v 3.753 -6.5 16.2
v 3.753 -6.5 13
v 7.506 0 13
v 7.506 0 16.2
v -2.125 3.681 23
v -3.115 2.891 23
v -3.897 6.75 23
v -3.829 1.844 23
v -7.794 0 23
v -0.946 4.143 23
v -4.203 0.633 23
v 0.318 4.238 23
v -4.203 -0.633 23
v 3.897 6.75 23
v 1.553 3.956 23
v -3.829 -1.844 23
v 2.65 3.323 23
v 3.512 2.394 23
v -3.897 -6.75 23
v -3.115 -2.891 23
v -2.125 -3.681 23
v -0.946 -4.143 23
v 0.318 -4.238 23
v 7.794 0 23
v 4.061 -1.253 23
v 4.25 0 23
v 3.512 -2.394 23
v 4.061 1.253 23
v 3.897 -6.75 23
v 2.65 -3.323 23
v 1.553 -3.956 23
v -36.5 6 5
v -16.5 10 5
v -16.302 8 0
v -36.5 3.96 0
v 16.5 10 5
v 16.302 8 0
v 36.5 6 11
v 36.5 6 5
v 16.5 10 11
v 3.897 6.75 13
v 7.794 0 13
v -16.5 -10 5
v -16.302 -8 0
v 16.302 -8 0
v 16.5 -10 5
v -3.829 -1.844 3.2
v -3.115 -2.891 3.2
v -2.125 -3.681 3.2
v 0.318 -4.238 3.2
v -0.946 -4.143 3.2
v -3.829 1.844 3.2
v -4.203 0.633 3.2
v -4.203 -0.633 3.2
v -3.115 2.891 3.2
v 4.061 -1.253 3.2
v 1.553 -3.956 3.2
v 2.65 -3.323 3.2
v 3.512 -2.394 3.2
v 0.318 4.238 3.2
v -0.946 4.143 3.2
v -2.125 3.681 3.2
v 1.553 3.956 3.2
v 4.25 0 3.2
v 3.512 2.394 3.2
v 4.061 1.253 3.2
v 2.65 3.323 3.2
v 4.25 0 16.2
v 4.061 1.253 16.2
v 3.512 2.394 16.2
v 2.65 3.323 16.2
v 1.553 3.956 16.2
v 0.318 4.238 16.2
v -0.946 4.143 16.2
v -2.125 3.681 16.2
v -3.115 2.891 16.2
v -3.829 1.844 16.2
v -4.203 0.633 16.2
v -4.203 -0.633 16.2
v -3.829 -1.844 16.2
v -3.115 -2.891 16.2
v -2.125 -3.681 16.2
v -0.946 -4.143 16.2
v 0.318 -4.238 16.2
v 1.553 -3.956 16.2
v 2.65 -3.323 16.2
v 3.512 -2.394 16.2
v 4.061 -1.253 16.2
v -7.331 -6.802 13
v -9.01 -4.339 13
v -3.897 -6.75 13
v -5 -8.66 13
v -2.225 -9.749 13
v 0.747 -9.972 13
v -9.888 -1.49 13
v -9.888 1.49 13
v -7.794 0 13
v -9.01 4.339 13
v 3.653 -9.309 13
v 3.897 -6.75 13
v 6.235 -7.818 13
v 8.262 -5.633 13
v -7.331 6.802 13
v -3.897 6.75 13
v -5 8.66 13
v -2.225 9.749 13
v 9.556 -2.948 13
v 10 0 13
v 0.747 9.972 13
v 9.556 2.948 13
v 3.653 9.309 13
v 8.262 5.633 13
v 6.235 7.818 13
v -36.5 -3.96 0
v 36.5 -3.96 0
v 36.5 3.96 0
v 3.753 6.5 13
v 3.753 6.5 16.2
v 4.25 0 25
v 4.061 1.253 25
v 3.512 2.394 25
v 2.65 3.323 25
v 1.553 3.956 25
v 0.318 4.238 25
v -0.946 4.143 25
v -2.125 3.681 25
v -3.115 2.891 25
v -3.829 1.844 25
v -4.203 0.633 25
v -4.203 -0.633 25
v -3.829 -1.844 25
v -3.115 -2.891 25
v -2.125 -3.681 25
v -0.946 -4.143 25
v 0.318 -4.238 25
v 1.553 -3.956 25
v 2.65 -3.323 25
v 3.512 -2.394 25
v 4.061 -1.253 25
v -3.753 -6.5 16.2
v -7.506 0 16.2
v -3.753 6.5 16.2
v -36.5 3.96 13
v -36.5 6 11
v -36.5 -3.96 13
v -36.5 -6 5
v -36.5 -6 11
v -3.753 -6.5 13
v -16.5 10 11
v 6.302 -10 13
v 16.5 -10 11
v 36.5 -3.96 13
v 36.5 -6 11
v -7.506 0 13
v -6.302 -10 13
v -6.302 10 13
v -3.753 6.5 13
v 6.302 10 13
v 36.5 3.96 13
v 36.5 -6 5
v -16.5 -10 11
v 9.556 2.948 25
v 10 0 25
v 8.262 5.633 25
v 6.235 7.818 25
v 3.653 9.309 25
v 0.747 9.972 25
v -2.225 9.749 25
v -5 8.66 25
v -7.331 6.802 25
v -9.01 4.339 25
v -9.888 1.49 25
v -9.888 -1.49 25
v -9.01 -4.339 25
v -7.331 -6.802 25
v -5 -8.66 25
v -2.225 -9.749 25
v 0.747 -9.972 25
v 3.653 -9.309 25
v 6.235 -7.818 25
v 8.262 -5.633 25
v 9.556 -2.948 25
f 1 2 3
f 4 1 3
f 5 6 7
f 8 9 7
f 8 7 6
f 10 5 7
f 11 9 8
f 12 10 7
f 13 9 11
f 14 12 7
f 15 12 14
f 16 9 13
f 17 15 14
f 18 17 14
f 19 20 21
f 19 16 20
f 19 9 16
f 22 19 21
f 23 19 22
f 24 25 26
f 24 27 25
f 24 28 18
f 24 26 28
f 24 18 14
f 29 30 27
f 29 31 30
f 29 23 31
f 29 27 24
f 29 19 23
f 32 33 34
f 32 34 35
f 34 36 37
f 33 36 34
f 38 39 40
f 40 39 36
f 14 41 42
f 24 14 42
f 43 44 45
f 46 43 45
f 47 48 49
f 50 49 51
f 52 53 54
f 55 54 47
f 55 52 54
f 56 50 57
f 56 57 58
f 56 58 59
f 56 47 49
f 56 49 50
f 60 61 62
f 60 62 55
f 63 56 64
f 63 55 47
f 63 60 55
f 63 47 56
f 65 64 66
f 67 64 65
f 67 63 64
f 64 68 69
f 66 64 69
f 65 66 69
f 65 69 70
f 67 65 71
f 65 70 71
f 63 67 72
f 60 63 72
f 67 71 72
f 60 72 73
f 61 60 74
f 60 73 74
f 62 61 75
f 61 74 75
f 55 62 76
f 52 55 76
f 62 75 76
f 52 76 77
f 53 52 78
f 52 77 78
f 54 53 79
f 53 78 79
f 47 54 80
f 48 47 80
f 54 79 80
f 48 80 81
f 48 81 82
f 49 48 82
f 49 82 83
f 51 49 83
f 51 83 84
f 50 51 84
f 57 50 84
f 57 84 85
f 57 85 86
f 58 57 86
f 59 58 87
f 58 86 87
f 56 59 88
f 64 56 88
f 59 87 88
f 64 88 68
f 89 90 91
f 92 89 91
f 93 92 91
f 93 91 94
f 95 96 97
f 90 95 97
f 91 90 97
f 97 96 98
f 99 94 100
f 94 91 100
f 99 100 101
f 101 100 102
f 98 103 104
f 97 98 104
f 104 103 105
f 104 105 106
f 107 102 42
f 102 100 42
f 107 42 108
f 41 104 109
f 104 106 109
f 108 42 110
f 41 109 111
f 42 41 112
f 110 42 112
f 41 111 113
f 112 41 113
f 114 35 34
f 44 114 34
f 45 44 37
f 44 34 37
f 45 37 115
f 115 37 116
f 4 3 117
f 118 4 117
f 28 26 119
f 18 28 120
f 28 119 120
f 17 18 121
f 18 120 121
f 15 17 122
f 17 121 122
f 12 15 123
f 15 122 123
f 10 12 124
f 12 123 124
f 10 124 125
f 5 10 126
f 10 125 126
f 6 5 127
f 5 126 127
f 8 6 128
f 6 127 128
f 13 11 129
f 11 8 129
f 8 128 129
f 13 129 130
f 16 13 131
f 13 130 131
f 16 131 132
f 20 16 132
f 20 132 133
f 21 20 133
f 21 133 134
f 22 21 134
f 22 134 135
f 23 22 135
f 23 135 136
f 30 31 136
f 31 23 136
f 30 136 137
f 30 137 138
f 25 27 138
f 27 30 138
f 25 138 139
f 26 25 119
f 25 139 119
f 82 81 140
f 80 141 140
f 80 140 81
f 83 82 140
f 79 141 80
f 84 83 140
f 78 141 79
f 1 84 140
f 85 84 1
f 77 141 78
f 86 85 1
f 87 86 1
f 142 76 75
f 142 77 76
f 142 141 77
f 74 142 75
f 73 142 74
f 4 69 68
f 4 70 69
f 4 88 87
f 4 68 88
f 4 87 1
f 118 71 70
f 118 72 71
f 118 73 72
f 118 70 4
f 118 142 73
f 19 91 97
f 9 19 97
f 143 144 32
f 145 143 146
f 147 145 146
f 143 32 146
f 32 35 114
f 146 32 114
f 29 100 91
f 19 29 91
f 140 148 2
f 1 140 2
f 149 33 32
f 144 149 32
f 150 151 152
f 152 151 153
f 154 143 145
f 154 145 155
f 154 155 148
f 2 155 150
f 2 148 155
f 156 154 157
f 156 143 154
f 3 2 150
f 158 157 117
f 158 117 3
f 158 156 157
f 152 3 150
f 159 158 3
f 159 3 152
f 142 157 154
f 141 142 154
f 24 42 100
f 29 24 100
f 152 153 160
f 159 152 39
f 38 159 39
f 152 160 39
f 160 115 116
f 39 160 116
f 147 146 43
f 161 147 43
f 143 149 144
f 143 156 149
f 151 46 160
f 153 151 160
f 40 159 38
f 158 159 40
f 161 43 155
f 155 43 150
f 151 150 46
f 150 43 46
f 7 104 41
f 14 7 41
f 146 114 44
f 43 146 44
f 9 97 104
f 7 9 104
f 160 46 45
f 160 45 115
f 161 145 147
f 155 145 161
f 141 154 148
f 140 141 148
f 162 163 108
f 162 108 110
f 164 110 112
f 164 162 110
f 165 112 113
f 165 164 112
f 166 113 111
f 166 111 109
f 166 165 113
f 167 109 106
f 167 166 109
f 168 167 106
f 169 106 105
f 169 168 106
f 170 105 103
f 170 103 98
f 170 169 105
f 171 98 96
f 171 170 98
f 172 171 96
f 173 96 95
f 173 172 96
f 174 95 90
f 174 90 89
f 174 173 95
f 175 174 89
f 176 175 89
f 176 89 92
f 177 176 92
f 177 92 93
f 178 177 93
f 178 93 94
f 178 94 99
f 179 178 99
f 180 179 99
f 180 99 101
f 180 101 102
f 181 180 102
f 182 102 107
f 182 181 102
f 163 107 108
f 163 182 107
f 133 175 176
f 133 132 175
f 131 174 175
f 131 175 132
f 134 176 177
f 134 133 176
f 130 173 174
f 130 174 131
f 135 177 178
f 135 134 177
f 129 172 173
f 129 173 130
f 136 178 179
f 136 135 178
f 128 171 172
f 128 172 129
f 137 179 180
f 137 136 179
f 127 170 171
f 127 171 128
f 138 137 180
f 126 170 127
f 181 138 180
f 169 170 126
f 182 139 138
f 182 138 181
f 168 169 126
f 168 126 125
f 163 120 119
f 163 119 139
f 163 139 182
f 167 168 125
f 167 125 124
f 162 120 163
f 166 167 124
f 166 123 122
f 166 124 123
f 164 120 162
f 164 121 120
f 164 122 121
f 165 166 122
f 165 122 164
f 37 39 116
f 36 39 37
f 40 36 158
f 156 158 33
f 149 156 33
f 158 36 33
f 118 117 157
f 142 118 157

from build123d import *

# Parameters (mm, degrees)
F1_DEPTH    = 13
F3_DEPTH    = 3.2
F4_R        = 4.25
F5_DEPTH    = 13
F6_C1_SIZE2 = 2
F6_C1_SIZE  = 5
F6_C2_SIZE2 = 2
F6_C2_SIZE  = 5
F6_C3_SIZE2 = 5
F6_C3_SIZE  = 2
F6_C4_SIZE2 = 5
F6_C4_SIZE  = 2
F6_C5_SIZE2 = 5
F6_C5_SIZE  = 2
F6_C6_SIZE2 = 5
F6_C6_SIZE  = 2
F7_SIZE     = 2
F9_R        = 10
F9_R_2      = 4.25
F10_DEPTH   = 12
F11_R       = 4.25
F12_DEPTH   = 10


with BuildPart() as f1:
    # F0 (on Top) → F1 (new body)
    with BuildSketch(Plane.XY):
        Polygon((-16.5, -10), (16.5, -10), (36.5, -6), (36.5, 6), (16.5, 10), (-16.5, 10), (-36.5, 6), (-36.5, -6), align=None)
    extrude(amount=F1_DEPTH)

    # F2 (on face) → F3 (join)
    with BuildSketch(Plane.XY.offset(13)):
        Polygon((-3.7527767497, -6.5), (3.7527767497, -6.5), (7.5055534995, 0), (3.7527767497, 6.5), (-3.7527767497, 6.5), (-7.5055534995, 0), align=None)
    extrude(amount=F3_DEPTH)

    # F4 (on face) → F5 (cut)
    with BuildSketch(Plane.XY.offset(16.2)):
        Circle(F4_R)
    extrude(amount=-F5_DEPTH, mode=Mode.SUBTRACT)

    # F6: chamfer of 5 x 2 on 6 edges, made by hand

    # F6_c1
    f6_c1_edges = [f1.edges().sort_by_distance(p)[0] for p in [
        (0, -10, 0),
    ]]
    f6_c1_side = f1.faces().sort_by_distance((0, -10, 0.04))[0]
    chamfer(f6_c1_edges, length=F6_C1_SIZE, length2=F6_C1_SIZE2, reference=f6_c1_side)

    # F6_c2
    f6_c2_edges = [f1.edges().sort_by_distance(p)[0] for p in [
        (-31.5, -7, 0),
    ]]
    f6_c2_side = f1.faces().sort_by_distance((-31.5, -7, 0.04))[0]
    chamfer(f6_c2_edges, length=F6_C2_SIZE, length2=F6_C2_SIZE2, reference=f6_c2_side)

    # F6_c3
    f6_c3_edges = [f1.edges().sort_by_distance(p)[0] for p in [
        (31.5, -7, 0),
    ]]
    f6_c3_side = f1.faces().sort_by_distance((31.4921553546, -6.960776773, 0))[0]
    chamfer(f6_c3_edges, length=F6_C3_SIZE, length2=F6_C3_SIZE2, reference=f6_c3_side)

    # F6_c4
    f6_c4_edges = [f1.edges().sort_by_distance(p)[0] for p in [
        (26.5, 8, 0),
    ]]
    f6_c4_side = f1.faces().sort_by_distance((26.4921553546, 7.960776773, 0))[0]
    chamfer(f6_c4_edges, length=F6_C4_SIZE, length2=F6_C4_SIZE2, reference=f6_c4_side)

    # F6_c5
    f6_c5_edges = [f1.edges().sort_by_distance(p)[0] for p in [
        (-5.0990195136, 10, 0),
    ]]
    f6_c5_side = f1.faces().sort_by_distance((-5.0990195136, 9.96, 0))[0]
    chamfer(f6_c5_edges, length=F6_C5_SIZE, length2=F6_C5_SIZE2, reference=f6_c5_side)

    # F6_c6
    f6_c6_edges = [f1.edges().sort_by_distance(p)[0] for p in [
        (-31.5, 7, 0),
    ]]
    f6_c6_side = f1.faces().sort_by_distance((-31.4921553546, 6.960776773, 0))[0]
    chamfer(f6_c6_edges, length=F6_C6_SIZE, length2=F6_C6_SIZE2, reference=f6_c6_side)

    # F7
    f7_edges = [f1.edges().sort_by_distance(p)[0] for p in [
        (26.5, -8, 13),
        (26.5, 8, 13),
        (-26.5, 8, 13),
        (-26.5, -8, 13),
    ]]
    chamfer(f7_edges, length=F7_SIZE)


with BuildPart() as f10:
    # F9 (on offset) → F10 (new body)
    with BuildSketch(Plane.XY.offset(25)):
        Circle(F9_R)
        Circle(F9_R_2, mode=Mode.SUBTRACT)
    extrude(amount=-F10_DEPTH)

    # F11 (on face) → F12 (cut)
    with BuildSketch(Plane(origin=(0, 0, 13), x_dir=(1, 0, 0), z_dir=(0, 0, -1))):
        Polygon((-3.897114317, -6.75), (3.897114317, -6.75), (7.7942286341, 0), (3.897114317, 6.75), (-3.897114317, 6.75), (-7.7942286341, 0), align=None)
        Circle(F11_R, mode=Mode.SUBTRACT)
    extrude(amount=-F12_DEPTH, mode=Mode.SUBTRACT)


solid = Compound([f1.part, f10.part])
